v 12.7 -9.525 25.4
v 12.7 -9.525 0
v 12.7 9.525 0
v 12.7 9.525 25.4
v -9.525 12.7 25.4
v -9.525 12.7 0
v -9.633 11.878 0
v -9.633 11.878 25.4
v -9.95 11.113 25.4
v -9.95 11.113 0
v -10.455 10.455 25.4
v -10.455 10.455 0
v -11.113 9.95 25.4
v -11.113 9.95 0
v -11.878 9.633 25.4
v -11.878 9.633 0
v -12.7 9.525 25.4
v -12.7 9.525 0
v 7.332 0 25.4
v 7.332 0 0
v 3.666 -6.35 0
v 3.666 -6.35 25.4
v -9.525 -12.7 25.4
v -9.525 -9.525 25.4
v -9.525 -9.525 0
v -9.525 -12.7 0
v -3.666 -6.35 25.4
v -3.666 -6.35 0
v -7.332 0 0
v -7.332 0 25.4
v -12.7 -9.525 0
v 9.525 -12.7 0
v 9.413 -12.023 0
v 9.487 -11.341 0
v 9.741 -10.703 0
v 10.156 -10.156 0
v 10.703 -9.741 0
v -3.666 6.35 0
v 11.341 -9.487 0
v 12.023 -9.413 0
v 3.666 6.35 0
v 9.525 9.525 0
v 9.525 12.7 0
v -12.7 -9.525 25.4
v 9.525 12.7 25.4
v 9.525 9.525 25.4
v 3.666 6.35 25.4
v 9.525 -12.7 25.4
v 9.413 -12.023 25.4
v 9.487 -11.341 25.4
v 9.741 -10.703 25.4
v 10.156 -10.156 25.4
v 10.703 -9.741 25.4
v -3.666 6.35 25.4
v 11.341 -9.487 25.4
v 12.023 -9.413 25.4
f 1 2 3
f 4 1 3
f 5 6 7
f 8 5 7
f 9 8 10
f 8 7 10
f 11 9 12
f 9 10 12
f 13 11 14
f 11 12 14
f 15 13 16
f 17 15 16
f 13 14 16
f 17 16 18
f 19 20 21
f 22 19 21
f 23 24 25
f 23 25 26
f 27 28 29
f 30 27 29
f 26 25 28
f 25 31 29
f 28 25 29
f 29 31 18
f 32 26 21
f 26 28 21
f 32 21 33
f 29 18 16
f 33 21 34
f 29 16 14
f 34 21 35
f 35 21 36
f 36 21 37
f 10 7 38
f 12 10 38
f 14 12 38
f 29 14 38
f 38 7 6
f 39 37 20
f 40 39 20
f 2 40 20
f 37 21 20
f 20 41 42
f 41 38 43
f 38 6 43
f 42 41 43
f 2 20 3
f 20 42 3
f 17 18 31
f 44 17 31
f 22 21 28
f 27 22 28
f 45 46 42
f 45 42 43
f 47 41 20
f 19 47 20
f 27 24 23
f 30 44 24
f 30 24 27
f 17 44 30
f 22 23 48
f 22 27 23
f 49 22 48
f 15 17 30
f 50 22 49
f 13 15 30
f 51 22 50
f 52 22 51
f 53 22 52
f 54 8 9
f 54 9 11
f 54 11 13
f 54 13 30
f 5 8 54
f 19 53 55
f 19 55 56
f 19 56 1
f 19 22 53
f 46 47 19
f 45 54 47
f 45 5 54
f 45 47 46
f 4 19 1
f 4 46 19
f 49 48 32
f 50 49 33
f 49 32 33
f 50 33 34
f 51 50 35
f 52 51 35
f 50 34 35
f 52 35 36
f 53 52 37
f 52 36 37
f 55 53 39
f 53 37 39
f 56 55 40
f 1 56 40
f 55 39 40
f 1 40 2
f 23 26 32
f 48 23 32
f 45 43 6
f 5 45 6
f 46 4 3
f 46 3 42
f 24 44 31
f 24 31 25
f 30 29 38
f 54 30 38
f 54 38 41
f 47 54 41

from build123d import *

# Parameters (mm, degrees)
F1_DEPTH = 25.4


with BuildPart() as f1:
    # F0 (on Top) → F1 (new body)
    with BuildSketch(Plane.XY):
        with BuildLine():
            Line((9.525, 9.525), (9.525, 12.7))
            Line((9.525, 12.7), (-9.525, 12.7))
            ThreePointArc((-9.525, 12.7), (-10.454936, 10.454936), (-12.7, 9.525))
            Line((-12.7, 9.525), (-12.7, -9.525))
            Line((-12.7, -9.525), (-9.525, -9.525))
            Line((-9.525, -9.525), (-9.525, -12.7))
            Line((-9.525, -12.7), (9.525, -12.7))
            ThreePointArc((9.525, -12.7), (10.156475, -10.156475), (12.7, -9.525))
            Line((12.7, -9.525), (12.7, 9.525))
            Line((12.7, 9.525), (9.525, 9.525))
        make_face()
        Polygon((-3.666174, 6.35), (3.666174, 6.35), (7.332348, 0), (3.666174, -6.35), (-3.666174, -6.35), (-7.332348, 0), align=None, mode=Mode.SUBTRACT)
    extrude(amount=F1_DEPTH)


solid = f1.part
